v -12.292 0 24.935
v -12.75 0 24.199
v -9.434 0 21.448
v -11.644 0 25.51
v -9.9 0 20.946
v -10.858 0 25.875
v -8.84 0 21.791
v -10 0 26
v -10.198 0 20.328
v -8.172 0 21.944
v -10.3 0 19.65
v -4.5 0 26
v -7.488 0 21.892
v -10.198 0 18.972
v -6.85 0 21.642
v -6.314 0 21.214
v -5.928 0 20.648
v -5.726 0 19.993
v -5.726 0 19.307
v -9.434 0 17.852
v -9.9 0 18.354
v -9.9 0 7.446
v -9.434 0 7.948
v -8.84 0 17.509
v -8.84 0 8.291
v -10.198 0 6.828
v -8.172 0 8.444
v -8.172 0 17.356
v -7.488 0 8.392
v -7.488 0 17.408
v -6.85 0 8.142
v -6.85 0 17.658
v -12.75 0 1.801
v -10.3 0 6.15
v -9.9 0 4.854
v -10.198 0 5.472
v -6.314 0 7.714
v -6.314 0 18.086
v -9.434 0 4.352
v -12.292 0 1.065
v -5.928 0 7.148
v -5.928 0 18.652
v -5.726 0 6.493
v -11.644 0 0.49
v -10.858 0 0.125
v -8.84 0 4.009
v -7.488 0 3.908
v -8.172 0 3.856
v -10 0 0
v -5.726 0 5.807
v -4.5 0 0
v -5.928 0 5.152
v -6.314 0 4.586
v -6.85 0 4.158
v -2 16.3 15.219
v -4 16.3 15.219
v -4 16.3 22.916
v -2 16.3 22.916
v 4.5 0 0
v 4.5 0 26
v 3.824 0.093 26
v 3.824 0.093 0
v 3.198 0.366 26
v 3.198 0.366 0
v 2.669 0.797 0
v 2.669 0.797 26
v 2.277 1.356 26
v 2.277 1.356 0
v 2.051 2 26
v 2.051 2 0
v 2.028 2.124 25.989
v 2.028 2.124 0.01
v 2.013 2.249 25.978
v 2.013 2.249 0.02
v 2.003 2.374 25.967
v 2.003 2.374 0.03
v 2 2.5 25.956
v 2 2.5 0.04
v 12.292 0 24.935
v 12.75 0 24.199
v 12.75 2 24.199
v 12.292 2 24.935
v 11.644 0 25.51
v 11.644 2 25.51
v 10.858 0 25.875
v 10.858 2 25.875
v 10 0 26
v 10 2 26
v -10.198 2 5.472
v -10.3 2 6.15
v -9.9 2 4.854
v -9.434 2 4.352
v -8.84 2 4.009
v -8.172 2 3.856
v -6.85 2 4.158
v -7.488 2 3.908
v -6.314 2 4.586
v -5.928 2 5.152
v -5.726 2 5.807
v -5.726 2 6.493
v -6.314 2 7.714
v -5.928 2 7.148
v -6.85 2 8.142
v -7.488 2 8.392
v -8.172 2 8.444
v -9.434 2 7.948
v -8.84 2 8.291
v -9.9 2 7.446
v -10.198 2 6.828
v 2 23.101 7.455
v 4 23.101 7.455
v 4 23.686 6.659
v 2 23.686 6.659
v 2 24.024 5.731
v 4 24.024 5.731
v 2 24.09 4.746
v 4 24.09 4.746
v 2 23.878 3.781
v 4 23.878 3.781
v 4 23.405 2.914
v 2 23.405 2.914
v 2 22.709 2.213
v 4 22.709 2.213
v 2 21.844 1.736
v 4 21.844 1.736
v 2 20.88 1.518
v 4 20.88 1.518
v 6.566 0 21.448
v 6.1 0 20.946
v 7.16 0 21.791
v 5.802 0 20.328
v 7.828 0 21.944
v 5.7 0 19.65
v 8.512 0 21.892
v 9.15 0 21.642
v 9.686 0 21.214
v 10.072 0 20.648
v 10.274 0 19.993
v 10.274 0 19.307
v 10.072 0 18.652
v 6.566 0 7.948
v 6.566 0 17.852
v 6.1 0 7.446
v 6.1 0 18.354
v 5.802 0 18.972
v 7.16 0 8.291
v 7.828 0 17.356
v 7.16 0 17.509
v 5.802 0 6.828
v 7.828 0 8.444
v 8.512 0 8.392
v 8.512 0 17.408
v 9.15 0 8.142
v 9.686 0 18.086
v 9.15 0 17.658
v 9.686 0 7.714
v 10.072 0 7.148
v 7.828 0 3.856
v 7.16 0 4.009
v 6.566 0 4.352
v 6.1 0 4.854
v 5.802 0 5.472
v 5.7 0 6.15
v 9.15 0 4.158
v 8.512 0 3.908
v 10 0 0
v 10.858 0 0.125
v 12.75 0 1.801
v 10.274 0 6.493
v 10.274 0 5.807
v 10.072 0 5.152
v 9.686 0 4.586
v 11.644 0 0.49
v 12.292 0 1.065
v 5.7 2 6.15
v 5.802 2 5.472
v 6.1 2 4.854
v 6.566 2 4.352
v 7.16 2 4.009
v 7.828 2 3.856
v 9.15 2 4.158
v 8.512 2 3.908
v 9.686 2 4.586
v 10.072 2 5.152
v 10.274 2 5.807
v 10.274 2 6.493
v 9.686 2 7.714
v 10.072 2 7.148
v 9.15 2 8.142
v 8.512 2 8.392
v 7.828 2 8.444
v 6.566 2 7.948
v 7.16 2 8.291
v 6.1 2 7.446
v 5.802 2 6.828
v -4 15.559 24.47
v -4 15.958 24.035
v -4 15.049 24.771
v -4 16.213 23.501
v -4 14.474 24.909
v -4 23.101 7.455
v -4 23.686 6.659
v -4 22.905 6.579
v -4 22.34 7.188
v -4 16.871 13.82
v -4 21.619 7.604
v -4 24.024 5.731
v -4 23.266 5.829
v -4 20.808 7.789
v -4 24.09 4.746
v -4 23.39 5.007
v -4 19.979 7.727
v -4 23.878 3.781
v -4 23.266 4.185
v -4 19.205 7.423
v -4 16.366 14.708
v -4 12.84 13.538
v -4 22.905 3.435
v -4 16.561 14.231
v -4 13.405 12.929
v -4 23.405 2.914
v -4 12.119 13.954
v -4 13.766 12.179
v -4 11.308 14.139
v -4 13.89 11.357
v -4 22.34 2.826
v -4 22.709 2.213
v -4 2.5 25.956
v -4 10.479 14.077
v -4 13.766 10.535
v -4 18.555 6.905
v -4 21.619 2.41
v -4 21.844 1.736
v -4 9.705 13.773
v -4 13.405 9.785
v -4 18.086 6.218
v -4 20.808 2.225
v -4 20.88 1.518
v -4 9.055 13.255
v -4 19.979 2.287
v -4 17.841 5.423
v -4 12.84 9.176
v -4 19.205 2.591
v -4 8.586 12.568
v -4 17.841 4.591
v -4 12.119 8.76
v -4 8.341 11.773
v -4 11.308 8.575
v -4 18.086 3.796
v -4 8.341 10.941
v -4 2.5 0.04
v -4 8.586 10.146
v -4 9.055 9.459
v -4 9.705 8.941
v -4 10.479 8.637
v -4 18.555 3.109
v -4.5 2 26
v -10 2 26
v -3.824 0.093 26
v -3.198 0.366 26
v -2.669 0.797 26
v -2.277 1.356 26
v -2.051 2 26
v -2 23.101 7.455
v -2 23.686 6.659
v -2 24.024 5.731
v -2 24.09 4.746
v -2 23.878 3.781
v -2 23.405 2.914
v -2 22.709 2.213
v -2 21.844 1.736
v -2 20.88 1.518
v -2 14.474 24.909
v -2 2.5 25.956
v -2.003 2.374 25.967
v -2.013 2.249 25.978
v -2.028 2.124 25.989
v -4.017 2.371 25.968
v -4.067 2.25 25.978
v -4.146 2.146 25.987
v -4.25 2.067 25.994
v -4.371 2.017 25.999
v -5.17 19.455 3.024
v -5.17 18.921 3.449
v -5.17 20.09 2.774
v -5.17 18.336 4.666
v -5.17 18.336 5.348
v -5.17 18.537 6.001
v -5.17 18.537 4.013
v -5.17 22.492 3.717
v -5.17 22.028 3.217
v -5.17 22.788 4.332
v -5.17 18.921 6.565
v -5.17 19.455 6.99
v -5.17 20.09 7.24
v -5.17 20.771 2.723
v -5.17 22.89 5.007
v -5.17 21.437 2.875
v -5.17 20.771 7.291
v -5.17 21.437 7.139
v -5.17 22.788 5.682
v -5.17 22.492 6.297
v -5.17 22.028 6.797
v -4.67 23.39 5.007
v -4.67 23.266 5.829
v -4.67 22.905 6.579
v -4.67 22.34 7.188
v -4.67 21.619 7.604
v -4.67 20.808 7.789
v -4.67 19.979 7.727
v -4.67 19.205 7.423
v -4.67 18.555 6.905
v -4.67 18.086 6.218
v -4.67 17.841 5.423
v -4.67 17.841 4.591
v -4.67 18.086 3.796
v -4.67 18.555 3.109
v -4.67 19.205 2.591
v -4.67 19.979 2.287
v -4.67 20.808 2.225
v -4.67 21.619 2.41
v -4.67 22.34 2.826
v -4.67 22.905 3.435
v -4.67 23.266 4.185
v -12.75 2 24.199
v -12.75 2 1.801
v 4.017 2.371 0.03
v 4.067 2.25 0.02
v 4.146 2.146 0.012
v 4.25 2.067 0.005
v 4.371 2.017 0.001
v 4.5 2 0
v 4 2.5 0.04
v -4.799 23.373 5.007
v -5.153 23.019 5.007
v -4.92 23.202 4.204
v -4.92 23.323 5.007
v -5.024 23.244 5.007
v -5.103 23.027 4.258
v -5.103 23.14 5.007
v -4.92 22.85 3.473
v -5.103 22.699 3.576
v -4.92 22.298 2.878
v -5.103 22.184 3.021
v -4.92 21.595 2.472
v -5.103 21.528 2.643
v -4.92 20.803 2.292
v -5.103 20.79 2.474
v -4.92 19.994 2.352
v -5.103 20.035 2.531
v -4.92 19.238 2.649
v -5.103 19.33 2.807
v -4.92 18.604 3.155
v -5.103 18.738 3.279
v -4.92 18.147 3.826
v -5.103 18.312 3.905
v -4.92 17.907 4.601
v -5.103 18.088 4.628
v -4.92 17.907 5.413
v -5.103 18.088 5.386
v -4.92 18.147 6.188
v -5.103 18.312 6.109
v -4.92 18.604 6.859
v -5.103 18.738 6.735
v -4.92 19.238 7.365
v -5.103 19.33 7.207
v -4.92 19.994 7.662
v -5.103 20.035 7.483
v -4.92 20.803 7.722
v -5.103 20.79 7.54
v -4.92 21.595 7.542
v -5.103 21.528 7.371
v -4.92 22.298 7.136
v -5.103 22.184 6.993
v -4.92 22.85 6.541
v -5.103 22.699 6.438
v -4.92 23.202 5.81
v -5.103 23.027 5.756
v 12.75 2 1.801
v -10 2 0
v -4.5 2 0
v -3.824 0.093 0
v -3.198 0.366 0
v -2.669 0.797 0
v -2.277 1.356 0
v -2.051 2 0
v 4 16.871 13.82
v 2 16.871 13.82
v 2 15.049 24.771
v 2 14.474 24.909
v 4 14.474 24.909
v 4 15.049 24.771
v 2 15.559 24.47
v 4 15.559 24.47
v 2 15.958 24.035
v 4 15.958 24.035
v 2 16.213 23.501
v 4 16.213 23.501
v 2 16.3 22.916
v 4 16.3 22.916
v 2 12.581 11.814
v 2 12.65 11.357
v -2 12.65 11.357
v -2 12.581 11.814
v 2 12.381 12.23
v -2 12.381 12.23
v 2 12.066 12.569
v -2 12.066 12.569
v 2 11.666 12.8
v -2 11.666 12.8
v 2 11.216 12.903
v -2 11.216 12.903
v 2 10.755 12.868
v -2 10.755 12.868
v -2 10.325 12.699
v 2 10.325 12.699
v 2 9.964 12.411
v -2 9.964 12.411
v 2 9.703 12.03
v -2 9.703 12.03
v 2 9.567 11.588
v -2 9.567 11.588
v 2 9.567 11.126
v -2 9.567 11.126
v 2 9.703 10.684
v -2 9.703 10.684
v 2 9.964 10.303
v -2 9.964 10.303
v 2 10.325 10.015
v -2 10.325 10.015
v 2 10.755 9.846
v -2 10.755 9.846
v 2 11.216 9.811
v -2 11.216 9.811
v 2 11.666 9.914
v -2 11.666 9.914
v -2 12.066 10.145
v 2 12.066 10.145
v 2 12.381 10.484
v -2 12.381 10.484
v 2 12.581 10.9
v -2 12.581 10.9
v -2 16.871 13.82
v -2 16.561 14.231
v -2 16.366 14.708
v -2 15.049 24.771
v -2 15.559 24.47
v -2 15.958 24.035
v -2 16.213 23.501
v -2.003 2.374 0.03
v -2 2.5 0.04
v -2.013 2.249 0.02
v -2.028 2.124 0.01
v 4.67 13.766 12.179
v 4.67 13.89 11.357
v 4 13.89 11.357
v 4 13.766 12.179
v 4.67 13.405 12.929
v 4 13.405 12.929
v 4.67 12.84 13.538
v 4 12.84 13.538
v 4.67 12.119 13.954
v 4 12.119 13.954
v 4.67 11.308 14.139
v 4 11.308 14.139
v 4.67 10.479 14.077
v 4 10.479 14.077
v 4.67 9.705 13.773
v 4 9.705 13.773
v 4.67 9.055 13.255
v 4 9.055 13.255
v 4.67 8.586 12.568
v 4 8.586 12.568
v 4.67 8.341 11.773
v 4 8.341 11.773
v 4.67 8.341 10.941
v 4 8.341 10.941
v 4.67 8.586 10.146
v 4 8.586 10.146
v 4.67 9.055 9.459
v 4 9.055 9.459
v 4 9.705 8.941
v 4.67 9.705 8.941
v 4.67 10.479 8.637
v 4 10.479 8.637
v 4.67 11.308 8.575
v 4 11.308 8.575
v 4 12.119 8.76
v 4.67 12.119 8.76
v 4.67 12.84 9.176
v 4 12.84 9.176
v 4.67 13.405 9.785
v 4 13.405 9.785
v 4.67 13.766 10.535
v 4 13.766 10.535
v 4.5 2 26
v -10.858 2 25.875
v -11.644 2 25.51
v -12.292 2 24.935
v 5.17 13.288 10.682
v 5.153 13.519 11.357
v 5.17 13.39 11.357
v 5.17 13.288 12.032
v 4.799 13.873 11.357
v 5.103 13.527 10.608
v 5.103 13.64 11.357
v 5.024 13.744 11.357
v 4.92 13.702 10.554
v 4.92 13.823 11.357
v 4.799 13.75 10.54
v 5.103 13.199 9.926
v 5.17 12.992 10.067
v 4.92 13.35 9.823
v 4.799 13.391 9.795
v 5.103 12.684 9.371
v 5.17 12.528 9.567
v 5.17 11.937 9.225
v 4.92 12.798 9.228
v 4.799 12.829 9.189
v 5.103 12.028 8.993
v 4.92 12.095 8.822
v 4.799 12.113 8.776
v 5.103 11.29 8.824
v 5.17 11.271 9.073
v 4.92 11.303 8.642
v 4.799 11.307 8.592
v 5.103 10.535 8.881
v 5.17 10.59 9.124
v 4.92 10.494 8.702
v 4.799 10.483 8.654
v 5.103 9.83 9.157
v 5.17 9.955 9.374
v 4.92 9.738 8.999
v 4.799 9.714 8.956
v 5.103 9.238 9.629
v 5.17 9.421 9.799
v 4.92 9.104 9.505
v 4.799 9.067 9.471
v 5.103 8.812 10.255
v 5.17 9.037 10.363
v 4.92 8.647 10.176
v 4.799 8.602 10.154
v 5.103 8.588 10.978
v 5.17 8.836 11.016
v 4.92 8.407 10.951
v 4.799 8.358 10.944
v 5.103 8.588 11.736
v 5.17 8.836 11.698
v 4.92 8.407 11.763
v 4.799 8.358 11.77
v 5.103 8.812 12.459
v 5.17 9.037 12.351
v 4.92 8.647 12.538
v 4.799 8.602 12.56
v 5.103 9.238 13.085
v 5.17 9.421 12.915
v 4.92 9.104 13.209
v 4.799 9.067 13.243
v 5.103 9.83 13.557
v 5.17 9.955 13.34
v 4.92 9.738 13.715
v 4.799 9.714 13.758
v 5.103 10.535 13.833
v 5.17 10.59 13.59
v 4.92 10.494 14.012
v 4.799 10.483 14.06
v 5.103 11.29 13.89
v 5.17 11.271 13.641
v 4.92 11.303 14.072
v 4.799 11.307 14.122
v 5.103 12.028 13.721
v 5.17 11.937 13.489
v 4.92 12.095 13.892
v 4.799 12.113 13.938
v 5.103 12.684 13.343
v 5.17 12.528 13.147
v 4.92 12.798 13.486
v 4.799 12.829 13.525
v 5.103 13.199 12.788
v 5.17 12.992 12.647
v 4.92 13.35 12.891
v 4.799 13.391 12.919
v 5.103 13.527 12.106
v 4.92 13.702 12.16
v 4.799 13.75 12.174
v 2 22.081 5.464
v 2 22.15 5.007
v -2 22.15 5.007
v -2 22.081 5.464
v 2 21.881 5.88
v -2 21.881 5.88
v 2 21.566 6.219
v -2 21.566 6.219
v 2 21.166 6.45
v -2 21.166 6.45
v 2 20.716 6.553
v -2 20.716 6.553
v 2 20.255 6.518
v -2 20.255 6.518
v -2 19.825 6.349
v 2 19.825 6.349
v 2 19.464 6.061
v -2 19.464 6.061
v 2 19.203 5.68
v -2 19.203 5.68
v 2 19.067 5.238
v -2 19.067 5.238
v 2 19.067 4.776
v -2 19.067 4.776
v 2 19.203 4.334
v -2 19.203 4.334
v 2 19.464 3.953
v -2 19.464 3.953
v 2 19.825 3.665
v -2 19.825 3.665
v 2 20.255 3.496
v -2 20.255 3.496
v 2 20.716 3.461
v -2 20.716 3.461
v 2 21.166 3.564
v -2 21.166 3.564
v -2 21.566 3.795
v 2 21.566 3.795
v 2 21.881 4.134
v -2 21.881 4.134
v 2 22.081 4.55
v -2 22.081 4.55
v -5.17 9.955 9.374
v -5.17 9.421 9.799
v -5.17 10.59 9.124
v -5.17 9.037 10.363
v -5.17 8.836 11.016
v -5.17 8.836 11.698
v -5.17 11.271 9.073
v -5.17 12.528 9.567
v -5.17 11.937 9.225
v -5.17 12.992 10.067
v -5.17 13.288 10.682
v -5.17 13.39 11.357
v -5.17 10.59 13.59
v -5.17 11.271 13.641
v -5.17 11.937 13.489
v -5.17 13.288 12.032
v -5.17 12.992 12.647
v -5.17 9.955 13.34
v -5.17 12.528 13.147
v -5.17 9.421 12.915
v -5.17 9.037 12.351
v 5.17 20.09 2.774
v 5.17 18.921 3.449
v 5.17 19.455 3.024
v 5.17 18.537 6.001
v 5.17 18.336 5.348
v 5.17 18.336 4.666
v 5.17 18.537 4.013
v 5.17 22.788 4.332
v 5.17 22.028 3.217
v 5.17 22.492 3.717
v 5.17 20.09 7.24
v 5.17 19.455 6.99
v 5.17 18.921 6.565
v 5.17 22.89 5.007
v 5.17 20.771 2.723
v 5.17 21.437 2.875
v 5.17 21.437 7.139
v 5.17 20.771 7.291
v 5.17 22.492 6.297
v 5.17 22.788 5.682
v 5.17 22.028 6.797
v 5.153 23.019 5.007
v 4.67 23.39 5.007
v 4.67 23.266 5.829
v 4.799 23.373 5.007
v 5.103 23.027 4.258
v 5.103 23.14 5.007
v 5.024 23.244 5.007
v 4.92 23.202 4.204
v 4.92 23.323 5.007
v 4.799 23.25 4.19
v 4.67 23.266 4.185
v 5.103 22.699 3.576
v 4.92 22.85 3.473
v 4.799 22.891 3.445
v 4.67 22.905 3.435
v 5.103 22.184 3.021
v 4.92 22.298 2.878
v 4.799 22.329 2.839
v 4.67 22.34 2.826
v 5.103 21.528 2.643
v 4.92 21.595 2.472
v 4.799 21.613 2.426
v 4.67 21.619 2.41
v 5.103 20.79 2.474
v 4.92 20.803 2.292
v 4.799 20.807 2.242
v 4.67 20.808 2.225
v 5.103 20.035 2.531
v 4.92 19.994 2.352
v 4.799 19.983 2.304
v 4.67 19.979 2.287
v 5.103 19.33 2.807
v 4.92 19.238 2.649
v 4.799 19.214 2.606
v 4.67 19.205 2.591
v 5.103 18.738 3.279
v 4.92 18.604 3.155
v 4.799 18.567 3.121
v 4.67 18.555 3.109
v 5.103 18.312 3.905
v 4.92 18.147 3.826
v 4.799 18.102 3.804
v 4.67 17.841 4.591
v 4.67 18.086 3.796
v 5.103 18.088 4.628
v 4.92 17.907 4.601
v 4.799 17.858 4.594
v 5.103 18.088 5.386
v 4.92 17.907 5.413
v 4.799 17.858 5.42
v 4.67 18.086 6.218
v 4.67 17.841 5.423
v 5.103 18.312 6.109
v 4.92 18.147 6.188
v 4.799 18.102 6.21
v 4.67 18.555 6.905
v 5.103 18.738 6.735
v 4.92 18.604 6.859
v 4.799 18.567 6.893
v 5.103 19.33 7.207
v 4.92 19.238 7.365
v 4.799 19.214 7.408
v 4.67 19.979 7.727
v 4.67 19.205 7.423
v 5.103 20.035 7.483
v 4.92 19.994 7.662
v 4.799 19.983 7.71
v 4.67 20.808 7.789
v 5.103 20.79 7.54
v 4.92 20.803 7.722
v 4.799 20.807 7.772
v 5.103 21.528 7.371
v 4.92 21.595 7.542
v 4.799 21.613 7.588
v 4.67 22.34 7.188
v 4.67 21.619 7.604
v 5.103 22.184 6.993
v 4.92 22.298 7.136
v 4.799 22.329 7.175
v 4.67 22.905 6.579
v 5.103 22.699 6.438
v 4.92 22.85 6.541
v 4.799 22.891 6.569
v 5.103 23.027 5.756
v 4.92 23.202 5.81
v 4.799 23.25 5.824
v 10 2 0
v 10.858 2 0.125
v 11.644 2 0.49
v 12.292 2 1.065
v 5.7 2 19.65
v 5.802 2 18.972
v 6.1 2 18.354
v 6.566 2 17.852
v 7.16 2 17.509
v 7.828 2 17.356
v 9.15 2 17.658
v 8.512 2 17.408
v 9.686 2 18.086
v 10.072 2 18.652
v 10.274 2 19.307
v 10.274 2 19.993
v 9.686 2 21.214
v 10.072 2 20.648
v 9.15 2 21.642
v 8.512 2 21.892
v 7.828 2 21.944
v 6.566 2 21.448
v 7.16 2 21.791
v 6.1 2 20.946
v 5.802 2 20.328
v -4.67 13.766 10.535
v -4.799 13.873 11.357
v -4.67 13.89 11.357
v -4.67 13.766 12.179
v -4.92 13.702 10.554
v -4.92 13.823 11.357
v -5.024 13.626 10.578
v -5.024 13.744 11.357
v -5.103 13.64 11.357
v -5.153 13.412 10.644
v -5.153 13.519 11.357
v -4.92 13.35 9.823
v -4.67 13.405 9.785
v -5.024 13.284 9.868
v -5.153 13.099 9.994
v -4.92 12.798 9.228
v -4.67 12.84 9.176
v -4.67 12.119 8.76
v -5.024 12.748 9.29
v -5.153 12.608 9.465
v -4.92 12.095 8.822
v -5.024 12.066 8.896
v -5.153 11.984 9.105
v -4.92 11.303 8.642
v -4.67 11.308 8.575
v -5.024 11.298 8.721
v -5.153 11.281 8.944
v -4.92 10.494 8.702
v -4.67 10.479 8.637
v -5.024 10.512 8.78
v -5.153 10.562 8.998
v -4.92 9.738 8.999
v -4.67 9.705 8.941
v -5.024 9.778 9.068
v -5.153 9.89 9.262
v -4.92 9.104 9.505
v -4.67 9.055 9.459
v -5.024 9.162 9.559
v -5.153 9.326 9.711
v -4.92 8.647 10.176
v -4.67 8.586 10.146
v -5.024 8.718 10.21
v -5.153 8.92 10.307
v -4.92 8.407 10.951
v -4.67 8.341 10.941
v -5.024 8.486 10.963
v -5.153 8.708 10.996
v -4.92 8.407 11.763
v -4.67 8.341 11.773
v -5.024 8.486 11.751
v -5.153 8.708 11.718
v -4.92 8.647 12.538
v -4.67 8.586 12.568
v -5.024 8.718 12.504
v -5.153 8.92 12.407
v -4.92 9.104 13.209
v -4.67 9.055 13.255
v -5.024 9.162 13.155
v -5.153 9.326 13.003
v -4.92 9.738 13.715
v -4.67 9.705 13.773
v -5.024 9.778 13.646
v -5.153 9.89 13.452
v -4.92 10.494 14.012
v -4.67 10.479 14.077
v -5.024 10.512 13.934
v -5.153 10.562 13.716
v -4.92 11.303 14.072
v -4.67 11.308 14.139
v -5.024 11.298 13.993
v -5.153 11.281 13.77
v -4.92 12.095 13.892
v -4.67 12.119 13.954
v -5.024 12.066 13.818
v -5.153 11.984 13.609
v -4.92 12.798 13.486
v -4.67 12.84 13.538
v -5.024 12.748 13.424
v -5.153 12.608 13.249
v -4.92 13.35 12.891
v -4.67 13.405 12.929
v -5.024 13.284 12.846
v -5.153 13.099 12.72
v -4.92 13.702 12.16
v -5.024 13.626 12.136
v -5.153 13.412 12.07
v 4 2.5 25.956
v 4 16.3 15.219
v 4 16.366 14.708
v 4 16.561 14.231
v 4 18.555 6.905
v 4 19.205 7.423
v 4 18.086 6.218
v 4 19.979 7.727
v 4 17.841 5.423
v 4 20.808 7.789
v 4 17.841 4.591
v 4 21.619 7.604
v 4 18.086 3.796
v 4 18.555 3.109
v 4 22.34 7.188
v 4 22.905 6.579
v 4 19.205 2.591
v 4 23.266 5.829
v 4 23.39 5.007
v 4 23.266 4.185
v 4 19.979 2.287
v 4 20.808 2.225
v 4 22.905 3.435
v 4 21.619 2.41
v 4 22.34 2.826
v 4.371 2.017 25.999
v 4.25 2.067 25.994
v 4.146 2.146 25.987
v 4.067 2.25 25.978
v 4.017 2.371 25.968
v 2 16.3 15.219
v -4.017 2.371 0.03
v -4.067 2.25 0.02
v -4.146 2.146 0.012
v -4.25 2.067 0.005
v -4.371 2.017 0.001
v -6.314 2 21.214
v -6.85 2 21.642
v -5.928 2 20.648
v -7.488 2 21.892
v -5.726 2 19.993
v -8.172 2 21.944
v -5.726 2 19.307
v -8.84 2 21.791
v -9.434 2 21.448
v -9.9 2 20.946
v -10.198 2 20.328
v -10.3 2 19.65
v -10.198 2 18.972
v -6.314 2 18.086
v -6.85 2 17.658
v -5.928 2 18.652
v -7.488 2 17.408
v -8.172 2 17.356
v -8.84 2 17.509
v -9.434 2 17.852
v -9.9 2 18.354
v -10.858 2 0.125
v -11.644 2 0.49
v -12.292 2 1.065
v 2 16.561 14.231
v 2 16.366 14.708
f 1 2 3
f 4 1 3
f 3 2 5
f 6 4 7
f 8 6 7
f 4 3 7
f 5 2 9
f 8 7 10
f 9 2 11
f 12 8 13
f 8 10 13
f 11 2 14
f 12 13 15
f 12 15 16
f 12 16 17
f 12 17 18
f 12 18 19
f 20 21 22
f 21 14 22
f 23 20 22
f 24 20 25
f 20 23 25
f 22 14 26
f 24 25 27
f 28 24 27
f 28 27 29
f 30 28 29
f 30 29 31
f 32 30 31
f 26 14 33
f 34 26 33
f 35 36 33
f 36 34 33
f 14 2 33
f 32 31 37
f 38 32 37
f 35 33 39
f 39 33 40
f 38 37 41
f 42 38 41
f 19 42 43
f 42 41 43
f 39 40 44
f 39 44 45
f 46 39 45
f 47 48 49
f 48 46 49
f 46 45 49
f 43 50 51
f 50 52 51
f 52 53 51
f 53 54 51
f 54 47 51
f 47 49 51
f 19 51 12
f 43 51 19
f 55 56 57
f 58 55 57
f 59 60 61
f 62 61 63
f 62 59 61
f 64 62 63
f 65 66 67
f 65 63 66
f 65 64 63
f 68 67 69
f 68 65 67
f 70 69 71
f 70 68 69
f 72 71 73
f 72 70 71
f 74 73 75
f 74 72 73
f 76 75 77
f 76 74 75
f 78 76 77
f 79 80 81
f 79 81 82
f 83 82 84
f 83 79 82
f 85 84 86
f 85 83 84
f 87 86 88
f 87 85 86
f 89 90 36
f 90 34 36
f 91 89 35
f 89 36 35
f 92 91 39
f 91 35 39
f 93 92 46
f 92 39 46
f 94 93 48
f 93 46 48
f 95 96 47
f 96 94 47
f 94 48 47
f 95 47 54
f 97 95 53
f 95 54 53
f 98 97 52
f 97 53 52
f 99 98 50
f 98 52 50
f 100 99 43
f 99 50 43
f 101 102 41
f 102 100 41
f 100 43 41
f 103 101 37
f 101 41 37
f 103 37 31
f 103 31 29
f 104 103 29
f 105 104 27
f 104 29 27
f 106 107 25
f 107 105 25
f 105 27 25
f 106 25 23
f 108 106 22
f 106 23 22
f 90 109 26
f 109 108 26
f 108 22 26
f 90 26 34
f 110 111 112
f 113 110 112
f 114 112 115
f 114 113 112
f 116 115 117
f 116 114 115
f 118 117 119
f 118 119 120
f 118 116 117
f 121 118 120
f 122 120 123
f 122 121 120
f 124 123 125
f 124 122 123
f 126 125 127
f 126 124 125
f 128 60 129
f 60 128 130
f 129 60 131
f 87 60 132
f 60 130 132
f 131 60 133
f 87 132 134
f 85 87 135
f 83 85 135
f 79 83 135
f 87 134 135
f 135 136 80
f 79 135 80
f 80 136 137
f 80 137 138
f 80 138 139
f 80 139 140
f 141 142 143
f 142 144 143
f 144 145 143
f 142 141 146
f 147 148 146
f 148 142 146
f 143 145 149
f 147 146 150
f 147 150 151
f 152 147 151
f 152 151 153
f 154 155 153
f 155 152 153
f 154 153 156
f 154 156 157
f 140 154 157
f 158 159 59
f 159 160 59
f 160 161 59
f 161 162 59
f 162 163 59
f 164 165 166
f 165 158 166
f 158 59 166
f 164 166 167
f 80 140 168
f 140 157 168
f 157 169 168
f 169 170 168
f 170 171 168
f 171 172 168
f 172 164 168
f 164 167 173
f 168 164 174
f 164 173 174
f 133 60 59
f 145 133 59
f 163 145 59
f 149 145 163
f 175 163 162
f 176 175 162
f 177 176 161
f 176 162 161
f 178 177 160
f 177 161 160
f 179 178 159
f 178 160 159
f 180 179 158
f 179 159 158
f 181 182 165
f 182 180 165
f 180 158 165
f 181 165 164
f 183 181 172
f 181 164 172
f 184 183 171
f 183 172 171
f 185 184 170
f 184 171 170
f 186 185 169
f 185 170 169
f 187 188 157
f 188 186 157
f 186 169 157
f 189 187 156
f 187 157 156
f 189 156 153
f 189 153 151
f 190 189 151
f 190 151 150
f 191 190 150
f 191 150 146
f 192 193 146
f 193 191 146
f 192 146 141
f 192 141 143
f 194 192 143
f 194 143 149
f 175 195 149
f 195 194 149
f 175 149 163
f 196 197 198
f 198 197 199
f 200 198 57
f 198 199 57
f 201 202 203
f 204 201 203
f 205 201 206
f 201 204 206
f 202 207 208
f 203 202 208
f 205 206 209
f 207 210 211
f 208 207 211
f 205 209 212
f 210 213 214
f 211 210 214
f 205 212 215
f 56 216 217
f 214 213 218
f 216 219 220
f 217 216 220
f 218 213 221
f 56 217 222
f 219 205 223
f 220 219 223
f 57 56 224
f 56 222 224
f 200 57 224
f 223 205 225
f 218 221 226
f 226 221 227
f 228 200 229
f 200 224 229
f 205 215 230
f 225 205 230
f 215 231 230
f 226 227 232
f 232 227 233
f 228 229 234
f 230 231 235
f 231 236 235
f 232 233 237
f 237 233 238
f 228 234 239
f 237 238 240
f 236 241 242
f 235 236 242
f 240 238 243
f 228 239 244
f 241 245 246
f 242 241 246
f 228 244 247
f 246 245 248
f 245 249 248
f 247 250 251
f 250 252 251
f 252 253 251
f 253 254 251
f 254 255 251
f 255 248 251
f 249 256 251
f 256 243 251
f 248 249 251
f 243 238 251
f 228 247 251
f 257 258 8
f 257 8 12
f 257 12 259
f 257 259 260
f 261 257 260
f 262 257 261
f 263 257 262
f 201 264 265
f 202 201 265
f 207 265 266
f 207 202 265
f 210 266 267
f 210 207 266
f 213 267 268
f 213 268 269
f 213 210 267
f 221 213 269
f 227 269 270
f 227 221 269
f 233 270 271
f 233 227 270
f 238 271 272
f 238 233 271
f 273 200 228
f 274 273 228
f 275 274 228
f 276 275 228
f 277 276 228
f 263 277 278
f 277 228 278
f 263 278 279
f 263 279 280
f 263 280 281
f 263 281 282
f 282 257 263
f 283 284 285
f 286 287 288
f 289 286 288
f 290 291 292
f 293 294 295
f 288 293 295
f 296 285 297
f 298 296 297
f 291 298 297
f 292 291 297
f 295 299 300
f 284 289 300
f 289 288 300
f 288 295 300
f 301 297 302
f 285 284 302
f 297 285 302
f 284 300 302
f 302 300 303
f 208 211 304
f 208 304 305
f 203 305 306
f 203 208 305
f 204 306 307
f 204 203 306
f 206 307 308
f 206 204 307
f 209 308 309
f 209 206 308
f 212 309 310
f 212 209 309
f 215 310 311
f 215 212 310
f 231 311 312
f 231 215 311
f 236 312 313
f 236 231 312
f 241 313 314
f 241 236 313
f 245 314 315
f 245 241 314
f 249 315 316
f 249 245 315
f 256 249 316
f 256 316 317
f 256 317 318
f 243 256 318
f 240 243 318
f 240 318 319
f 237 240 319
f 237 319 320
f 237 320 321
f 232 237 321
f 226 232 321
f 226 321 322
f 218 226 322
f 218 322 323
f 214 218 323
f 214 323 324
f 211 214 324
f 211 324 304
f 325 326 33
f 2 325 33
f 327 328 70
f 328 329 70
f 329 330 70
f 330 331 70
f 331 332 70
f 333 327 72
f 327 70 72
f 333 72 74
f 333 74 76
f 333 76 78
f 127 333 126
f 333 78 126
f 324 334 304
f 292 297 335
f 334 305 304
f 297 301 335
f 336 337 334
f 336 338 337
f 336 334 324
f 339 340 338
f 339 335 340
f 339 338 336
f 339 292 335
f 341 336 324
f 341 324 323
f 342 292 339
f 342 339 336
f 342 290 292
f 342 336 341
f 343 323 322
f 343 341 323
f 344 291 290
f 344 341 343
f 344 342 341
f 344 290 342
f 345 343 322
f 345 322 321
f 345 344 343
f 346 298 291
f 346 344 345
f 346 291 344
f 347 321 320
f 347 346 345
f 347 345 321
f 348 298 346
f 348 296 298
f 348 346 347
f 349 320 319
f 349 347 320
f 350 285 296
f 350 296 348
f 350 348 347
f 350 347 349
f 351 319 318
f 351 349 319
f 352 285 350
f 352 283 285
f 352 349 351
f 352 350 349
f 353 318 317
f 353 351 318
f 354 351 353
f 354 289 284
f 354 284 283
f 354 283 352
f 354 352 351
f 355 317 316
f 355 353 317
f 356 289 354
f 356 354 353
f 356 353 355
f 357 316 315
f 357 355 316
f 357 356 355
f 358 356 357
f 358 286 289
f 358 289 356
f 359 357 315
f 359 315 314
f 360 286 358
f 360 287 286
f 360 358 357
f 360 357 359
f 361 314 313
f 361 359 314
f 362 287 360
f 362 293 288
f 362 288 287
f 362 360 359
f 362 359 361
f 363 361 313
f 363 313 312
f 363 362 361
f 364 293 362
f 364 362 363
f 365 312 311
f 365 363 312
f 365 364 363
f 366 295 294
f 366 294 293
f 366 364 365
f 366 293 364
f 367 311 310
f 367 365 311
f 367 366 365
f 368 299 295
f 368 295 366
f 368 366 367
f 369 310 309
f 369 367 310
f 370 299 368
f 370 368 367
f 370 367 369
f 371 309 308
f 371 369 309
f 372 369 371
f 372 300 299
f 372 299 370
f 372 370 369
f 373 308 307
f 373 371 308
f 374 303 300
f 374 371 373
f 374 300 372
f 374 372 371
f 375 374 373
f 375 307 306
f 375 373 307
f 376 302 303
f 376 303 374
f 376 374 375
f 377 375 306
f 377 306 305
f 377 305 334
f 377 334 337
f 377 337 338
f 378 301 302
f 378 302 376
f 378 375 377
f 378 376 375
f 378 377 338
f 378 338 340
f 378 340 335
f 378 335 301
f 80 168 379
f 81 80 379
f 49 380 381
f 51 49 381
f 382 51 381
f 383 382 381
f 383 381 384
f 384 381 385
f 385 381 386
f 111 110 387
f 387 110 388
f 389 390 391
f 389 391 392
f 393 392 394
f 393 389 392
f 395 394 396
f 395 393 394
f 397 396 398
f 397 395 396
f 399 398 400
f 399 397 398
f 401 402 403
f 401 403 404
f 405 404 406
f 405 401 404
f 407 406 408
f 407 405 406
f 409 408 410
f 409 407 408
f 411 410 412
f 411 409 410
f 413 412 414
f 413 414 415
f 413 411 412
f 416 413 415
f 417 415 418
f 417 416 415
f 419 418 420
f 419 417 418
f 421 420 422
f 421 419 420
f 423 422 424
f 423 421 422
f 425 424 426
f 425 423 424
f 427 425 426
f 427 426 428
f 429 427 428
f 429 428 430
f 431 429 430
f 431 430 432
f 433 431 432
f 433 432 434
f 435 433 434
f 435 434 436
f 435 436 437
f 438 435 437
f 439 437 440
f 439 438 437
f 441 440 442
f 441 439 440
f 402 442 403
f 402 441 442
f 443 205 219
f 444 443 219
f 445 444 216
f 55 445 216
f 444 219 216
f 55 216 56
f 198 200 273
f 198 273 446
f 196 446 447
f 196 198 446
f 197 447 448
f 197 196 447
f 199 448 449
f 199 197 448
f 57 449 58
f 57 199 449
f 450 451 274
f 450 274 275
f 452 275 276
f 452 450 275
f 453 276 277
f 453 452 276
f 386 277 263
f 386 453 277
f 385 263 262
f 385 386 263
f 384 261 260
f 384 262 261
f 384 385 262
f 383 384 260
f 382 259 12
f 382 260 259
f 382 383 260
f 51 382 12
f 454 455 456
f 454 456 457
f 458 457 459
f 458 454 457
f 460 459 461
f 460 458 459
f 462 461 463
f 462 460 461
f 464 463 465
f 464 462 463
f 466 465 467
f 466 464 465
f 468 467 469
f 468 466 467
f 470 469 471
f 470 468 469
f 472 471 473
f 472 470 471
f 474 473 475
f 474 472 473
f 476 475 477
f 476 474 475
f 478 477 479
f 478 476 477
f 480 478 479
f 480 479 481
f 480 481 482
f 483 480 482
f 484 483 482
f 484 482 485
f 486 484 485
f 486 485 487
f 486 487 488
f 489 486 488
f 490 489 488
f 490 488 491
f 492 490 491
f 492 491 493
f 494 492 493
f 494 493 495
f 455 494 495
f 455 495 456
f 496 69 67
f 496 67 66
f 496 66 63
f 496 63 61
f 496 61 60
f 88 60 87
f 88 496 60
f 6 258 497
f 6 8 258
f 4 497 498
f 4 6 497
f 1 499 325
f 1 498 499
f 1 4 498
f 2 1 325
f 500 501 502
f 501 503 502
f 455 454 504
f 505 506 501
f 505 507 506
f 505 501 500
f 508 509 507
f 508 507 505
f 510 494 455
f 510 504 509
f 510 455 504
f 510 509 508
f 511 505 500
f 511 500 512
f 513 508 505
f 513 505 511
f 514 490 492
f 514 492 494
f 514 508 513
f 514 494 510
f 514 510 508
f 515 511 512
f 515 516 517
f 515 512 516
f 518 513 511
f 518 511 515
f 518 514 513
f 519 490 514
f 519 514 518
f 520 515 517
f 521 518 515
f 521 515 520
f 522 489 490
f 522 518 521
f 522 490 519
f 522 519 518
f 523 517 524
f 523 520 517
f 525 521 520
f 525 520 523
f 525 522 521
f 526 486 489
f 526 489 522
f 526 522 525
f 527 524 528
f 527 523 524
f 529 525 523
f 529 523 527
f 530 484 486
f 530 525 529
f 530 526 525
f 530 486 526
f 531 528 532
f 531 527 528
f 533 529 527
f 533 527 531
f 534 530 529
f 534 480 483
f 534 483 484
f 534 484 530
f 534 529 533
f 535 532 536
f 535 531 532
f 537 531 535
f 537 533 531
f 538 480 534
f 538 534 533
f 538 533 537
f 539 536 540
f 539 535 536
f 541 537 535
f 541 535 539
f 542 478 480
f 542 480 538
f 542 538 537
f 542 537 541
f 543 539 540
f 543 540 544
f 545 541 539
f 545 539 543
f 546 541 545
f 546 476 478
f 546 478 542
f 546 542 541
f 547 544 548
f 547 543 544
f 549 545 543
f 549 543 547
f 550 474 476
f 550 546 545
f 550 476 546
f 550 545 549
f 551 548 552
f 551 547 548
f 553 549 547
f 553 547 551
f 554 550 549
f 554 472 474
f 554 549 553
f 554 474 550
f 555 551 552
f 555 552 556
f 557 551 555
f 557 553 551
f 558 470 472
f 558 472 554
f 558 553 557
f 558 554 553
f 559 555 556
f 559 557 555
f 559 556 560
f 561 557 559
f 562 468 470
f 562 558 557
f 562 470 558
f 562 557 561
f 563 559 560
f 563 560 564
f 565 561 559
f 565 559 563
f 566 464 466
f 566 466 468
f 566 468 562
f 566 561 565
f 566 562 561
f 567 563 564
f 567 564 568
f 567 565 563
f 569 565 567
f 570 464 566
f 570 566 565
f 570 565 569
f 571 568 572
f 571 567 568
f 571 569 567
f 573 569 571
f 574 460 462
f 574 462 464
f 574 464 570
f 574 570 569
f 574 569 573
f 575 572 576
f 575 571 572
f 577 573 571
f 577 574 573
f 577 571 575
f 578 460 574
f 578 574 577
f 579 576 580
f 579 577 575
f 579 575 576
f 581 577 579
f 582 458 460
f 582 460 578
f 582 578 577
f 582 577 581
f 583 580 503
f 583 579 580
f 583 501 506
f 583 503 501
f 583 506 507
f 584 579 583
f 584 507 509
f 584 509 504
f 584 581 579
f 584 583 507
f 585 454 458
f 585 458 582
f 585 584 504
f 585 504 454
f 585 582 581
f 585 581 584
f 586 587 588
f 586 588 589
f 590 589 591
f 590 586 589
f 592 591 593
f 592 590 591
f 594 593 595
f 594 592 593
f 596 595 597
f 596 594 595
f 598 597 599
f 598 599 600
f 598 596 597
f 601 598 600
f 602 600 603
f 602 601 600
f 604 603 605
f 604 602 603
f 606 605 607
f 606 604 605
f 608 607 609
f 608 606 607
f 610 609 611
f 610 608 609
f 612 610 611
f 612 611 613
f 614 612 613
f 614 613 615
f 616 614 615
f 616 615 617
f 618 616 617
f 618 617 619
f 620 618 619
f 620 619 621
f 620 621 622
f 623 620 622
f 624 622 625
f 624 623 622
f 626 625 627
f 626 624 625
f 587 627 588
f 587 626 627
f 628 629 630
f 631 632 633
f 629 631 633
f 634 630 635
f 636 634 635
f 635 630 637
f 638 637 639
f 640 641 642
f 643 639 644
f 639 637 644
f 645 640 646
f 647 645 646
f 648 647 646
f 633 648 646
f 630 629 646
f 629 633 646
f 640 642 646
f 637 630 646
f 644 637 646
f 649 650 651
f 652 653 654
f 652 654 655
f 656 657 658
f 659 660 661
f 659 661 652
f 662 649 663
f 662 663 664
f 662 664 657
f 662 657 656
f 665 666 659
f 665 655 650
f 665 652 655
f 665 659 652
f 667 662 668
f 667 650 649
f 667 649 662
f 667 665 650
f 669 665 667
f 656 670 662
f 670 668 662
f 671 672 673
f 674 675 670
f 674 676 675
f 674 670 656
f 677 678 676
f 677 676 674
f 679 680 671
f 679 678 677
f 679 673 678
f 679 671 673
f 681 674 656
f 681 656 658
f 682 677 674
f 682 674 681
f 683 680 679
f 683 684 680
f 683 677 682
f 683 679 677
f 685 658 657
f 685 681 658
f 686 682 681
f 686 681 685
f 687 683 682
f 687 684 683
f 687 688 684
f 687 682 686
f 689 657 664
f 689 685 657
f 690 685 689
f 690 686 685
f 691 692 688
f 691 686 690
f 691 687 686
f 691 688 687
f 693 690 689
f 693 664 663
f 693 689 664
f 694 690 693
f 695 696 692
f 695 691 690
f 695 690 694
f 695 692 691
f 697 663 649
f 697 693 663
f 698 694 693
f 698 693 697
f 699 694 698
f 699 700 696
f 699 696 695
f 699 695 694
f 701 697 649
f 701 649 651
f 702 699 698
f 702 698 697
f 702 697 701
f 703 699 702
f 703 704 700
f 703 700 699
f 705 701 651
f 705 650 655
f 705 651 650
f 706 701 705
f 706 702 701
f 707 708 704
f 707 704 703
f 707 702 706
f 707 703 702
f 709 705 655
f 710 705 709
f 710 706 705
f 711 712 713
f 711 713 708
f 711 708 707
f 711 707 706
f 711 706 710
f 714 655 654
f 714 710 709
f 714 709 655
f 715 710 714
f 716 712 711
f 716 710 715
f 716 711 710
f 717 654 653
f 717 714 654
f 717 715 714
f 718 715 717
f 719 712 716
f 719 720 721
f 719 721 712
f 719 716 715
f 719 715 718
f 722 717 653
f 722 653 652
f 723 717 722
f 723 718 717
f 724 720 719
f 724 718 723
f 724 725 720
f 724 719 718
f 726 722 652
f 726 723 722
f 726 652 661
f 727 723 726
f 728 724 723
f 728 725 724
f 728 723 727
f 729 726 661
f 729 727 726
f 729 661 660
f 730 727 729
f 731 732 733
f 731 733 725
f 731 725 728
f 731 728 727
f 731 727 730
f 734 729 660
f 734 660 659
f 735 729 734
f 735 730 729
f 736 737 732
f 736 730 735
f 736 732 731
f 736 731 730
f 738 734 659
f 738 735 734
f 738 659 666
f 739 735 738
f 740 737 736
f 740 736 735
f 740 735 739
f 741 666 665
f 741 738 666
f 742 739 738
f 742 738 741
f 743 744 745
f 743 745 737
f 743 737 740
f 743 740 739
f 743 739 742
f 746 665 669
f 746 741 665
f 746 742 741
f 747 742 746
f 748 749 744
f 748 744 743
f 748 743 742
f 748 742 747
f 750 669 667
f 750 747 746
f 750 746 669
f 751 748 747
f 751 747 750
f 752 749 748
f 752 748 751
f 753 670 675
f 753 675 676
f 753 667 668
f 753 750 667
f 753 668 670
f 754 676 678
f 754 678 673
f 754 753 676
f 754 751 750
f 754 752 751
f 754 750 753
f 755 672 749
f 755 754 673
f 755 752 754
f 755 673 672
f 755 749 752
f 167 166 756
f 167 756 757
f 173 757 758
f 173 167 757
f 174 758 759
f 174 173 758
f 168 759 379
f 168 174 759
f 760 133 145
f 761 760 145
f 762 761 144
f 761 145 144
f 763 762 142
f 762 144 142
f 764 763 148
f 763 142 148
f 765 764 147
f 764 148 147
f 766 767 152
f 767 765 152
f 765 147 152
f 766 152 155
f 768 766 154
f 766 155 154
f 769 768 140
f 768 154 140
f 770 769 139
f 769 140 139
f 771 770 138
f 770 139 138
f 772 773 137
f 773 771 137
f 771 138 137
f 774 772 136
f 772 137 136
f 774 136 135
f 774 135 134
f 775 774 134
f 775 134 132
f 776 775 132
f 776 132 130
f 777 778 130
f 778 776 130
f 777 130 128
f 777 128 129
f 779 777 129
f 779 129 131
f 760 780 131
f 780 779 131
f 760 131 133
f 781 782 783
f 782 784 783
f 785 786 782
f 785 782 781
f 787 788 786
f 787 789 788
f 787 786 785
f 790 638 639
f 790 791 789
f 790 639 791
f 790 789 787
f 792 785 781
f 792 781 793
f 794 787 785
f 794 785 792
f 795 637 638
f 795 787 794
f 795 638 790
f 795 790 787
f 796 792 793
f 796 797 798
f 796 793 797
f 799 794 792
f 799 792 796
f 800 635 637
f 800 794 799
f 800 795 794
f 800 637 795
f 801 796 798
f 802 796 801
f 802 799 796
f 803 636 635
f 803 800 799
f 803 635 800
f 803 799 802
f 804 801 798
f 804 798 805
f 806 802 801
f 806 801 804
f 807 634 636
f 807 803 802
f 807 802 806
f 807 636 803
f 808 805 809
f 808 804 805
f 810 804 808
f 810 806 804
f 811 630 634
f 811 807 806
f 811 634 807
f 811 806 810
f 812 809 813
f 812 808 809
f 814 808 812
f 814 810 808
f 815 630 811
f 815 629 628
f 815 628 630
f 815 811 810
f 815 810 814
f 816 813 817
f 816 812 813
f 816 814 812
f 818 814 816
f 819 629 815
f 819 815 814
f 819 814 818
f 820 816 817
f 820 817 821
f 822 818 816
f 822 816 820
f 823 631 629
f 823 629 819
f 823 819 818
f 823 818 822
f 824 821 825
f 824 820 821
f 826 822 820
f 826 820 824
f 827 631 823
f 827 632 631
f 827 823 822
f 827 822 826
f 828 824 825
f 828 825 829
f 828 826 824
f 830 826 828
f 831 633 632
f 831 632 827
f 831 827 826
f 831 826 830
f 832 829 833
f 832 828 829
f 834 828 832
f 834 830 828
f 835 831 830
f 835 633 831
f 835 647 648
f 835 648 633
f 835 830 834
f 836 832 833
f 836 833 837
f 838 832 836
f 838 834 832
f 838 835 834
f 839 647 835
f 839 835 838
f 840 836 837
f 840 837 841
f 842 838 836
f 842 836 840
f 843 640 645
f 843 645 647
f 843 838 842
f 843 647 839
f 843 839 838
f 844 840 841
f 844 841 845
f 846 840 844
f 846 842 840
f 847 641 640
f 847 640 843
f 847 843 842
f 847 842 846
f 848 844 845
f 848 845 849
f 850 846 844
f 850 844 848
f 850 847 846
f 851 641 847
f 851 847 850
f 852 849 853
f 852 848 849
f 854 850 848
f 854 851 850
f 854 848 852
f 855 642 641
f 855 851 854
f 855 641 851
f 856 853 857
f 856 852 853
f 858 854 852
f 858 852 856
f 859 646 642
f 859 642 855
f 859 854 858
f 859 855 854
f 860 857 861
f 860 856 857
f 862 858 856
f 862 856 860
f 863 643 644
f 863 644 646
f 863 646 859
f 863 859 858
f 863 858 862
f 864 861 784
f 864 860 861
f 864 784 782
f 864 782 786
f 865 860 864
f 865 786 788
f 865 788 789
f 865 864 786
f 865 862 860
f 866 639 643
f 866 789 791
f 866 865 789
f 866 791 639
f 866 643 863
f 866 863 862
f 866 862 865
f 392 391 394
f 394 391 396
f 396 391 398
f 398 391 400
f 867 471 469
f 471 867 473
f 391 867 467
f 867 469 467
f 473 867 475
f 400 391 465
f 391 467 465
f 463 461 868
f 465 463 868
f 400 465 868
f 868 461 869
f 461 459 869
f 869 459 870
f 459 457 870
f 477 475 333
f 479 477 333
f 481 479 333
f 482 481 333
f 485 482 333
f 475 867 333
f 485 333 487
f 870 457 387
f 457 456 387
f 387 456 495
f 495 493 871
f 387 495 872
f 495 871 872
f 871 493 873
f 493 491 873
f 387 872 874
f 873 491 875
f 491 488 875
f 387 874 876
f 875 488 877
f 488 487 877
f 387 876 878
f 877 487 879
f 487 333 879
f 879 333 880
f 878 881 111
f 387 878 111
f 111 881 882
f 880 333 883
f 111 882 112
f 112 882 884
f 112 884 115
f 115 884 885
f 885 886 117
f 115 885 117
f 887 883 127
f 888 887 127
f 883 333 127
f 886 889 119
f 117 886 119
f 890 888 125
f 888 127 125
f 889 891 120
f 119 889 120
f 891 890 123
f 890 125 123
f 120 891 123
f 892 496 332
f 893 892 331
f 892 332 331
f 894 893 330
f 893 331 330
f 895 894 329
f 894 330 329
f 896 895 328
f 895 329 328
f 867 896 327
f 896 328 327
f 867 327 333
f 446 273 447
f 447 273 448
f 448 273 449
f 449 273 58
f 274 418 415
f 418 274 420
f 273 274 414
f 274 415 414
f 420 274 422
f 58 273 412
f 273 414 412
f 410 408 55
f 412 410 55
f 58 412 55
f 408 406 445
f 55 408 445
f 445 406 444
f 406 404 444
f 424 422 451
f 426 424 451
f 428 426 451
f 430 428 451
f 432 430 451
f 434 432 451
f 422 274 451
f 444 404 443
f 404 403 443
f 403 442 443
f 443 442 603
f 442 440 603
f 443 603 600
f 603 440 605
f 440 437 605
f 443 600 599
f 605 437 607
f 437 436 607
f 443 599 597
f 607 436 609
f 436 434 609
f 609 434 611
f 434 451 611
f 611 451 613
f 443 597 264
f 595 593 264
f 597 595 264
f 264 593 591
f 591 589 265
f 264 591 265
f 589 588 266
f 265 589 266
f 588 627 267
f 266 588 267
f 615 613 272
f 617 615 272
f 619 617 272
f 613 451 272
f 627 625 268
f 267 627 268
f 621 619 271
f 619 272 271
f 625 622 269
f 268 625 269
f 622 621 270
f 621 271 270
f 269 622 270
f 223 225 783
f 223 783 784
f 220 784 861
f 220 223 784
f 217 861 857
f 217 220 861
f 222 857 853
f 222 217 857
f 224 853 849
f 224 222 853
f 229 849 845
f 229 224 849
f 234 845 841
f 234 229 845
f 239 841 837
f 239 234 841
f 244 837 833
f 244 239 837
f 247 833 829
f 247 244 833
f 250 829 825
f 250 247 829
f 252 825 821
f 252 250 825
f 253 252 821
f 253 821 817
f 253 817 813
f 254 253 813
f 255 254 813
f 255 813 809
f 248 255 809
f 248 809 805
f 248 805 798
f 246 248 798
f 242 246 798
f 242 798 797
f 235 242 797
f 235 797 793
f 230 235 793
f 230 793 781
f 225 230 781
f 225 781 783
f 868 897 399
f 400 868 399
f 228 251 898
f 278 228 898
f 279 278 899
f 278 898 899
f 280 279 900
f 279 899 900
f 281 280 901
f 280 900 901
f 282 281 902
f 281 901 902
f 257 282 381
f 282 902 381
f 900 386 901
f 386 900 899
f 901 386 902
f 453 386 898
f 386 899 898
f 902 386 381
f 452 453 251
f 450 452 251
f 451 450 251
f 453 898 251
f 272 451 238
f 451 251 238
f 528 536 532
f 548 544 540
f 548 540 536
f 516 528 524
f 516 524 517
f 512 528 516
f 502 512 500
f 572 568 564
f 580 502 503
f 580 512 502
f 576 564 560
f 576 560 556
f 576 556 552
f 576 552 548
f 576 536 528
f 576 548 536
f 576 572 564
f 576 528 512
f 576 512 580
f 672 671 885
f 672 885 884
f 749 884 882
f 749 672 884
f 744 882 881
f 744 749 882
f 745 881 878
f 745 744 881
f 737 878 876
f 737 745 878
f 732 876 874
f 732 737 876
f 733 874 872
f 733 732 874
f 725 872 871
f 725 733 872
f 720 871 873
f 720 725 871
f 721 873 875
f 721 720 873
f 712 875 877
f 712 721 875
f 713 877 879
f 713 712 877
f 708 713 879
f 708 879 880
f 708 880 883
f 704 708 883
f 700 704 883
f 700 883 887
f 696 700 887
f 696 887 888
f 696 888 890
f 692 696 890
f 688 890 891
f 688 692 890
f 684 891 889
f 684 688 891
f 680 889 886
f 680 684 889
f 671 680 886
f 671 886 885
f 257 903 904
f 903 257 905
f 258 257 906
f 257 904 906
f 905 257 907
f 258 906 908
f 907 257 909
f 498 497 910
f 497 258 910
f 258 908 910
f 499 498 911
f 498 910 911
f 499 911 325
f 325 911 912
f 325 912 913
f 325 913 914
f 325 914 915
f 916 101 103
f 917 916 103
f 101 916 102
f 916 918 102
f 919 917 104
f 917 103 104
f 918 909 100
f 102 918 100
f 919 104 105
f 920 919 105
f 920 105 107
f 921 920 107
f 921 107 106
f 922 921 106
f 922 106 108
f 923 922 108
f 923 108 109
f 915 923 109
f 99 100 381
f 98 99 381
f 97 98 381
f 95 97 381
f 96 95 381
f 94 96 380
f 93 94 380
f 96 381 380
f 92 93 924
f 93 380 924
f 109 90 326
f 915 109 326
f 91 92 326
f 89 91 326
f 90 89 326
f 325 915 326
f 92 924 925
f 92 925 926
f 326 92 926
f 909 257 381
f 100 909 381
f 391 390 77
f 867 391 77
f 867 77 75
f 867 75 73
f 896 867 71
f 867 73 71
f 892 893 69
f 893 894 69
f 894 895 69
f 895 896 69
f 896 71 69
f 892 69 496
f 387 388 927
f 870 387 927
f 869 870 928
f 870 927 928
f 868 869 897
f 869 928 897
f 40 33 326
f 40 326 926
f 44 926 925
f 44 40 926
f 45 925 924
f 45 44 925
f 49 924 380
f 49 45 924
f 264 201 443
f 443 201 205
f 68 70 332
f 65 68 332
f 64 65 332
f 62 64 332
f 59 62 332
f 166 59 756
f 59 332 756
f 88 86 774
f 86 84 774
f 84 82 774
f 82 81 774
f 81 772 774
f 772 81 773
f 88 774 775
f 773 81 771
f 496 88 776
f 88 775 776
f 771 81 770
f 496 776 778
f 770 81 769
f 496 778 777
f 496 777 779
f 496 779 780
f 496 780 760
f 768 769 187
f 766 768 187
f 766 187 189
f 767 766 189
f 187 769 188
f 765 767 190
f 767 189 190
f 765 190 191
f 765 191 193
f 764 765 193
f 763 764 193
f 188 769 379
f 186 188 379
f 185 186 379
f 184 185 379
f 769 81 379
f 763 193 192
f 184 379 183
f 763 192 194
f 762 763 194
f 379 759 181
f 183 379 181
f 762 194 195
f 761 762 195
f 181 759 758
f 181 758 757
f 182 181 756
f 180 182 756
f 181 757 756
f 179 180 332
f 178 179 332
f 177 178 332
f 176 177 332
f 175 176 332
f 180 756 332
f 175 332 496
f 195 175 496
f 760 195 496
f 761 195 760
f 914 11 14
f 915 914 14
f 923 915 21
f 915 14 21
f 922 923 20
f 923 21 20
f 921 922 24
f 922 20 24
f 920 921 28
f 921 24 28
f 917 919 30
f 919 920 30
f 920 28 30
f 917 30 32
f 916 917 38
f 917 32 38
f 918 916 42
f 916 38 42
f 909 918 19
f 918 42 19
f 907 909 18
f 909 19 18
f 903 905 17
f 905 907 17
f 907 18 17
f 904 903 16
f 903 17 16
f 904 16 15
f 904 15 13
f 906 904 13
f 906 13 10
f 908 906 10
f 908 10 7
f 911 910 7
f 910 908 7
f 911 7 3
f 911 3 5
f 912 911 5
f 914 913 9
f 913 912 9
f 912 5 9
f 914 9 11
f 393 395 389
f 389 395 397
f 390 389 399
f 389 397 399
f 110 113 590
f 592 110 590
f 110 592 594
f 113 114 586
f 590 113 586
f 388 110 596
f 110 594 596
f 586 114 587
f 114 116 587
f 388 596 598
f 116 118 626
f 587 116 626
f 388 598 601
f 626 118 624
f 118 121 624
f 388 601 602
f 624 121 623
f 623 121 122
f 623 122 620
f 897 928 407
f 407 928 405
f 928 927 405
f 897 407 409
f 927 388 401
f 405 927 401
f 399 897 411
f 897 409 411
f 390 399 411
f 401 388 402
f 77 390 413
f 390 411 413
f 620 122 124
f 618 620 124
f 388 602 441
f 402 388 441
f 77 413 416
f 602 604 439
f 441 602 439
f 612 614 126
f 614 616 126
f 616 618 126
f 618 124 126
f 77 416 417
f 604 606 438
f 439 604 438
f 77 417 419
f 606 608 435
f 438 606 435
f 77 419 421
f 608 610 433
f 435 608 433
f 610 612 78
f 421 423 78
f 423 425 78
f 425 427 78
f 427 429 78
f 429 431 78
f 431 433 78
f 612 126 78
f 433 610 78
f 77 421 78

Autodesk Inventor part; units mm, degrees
sketch "Skizze_1" plane through (0, 0, 0) normal (0, 0, 1) x (1, 0, 0)
  arc A0 (2, 2.5) -> (4.5, 0) centre (4.5, 2.5) ccw
  line L0 (4.5, 0) -> (12.75, 0)
  line L1 (12.75, 0) -> (12.75, 2)
  line L2 (12.75, 2) -> (4.5, 2)
  arc A1 (4, 2.5) -> (4.5, 2) centre (4.5, 2.5) ccw
  line L3 (4, 2.5) -> (4, 30)
  line L4 (4, 30) -> (2, 30)
  line L5 (2, 30) -> (2, 2.5)
extrude "Extrusion1" add sketch "Skizze_1" along normal blind 26
sketch "Skizze_2" plane through (0, 0, 5.007) normal (0, 0, 1) x (1, 0, 0)
  line L0 (5.17, 20.6) -> (0, 20.6)
  line L1 (-5.17, 20.6) -> (-5.17, 22.89)
  arc A0 (-4.67, 23.39) -> (-5.17, 22.89) centre (-4.67, 22.89) ccw
  line L2 (-4.67, 23.39) -> (-4, 23.39)
  line L3 (-4, 23.39) -> (-4, 22.15)
  line L4 (-4, 22.15) -> (4, 22.15)
  line L5 (4, 22.15) -> (4, 23.39)
  line L6 (4, 23.39) -> (4.67, 23.39)
  arc A1 (5.17, 22.89) -> (4.67, 23.39) centre (4.67, 22.89) ccw
  line L7 (5.17, 22.89) -> (5.17, 20.6)
  line L8 (5.17, 20.6) -> (-5.17, 20.6)
revolve "Revolution1" add sketch "Skizze_2" angle 360 about axis through (5.17, 20.6, 5.007) along (1, 0, 0)
sketch "Skizze_3" plane through (0, 0, 11.357) normal (0, 0, 1) x (1, 0, 0)
  line L0 (5.17, 11.1) -> (0, 11.1)
  line L1 (-5.17, 11.1) -> (-5.17, 13.39)
  arc A0 (-4.67, 13.89) -> (-5.17, 13.39) centre (-4.67, 13.39) ccw
  line L2 (-4.67, 13.89) -> (-4, 13.89)
  line L3 (-4, 13.89) -> (-4, 12.65)
  line L4 (-4, 12.65) -> (4, 12.65)
  line L5 (4, 12.65) -> (4, 13.89)
  line L6 (4, 13.89) -> (4.67, 13.89)
  arc A1 (5.17, 13.39) -> (4.67, 13.89) centre (4.67, 13.39) ccw
  line L7 (5.17, 13.39) -> (5.17, 11.1)
  line L8 (5.17, 11.1) -> (-5.17, 11.1)
revolve "Revolution2" add sketch "Skizze_3" angle 360 about axis through (5.17, 11.1, 11.357) along (1, 0, 0)
sketch "Skizze_5" plane through (0, 0, 0) normal (0, 0, 1) x (1, 0, 0)
  line L0 (-12.75, 2) -> (-12.75, 0)
  line L1 (-12.75, 0) -> (-4.5, 0)
  arc A0 (-4.5, 0) -> (-2, 2.5) centre (-4.5, 2.5) ccw
  line L2 (-2, 2.5) -> (-2, 30)
  line L3 (-2, 30) -> (-4, 30)
  line L4 (-4, 30) -> (-4, 2.5)
  arc A1 (-4.5, 2) -> (-4, 2.5) centre (-4.5, 2.5) ccw
  line L5 (-4.5, 2) -> (-12.75, 2)
extrude "Extrusion2" add sketch "Skizze_5" along normal blind 26
sketch "Skizze_6" plane through (0, 0, 0) normal (1, 0, 0) x (0, 1, 0)
  line L0 (-41, 77) -> (-41, -76)
  line L1 (-41, -76) -> (70, -76)
  line L2 (70, -76) -> (70, 77)
  line L3 (70, 77) -> (-41, 77)
  line L4 (2, 26) -> (0, 26)
  line L5 (0, 26) -> (0, 0)
  line L6 (0, 0) -> (2, 0)
  line L7 (2, 0) -> (20.8805, 1.5183)
  arc A0 (20.8805, 1.5183) -> (23.1011, 7.4554) centre (20.6, 5.007) ccw
  line L8 (23.1011, 7.4554) -> (16.8708, 13.8197)
  arc A1 (16.3, 15.2188) -> (16.8708, 13.8197) centre (18.3, 15.2188) ccw
  line L9 (16.3, 15.2188) -> (16.3, 22.9162)
  arc A2 (16.3, 22.9162) -> (14.4743, 24.9086) centre (14.3, 22.9162) ccw
  line L10 (14.4743, 24.9086) -> (2, 26)
extrude "Extrusion3" cut sketch "Skizze_6" along normal mid plane 100
sketch "Skizze_7" plane through (0, 0, 0) normal (0, 1, 0) x (-1, 0, 0)
  line L0 (50, 50) -> (-61, 50)
  line L1 (-61, 50) -> (-61, -33)
  line L2 (-61, -33) -> (50, -33)
  line L3 (50, -33) -> (50, 50)
  arc A0 (13, 23) -> (10, 26) centre (10, 23) ccw
  line L4 (10, 26) -> (-10, 26)
  arc A1 (-10, 26) -> (-13, 23) centre (-10, 23) ccw
  line L5 (-13, 23) -> (-13, 3)
  arc A2 (-13, 3) -> (-10, 0) centre (-10, 3) ccw
  line L6 (-10, 0) -> (10, 0)
  arc A3 (10, 0) -> (13, 3) centre (10, 3) ccw
  line L7 (13, 3) -> (13, 23)
extrude "Extrusion4" cut sketch "Skizze_7" along normal blind 2
sketch "Skizze_8_ALT_Drilling_1" plane through (0, 0, 0) normal (0, 1, 0) x (-1, 0, 0)
  circle A0 centre (-8, 6.15) radius 2.3
extrude "Extrusion5" cut sketch "Skizze_8_ALT_Drilling_1" along normal blind 2
sketch "Skizze_9_ALT_Drilling_2" plane through (0, 0, 0) normal (0, 1, 0) x (-1, 0, 0)
  circle A0 centre (-8, 19.65) radius 2.3
extrude "Extrusion6" cut sketch "Skizze_9_ALT_Drilling_2" along normal blind 2
sketch "Skizze_10_ALT_Drilling_3" plane through (0, 0, 0) normal (0, 1, 0) x (-1, 0, 0)
  circle A0 centre (8, 6.15) radius 2.3
extrude "Extrusion7" cut sketch "Skizze_10_ALT_Drilling_3" along normal blind 2
sketch "Skizze_11_ALT_Drilling_4" plane through (0, 0, 0) normal (0, 1, 0) x (-1, 0, 0)
  circle A0 centre (8, 19.65) radius 2.3
extrude "Extrusion8" cut sketch "Skizze_11_ALT_Drilling_4" along normal blind 2
ref_plane "WF1_XY" through (0, 20.6, 5.007) normal (1, 0, 0) x (0, 0, -1)
ref_plane "WF1_YZ" through (0, 20.6, 5.007) normal (0, 0, -1) x (0, 1, 0)
ref_plane "WF1_ZX" through (0, 20.6, 5.007) normal (0, 1, 0) x (1, 0, 0)
ref_plane "WF2_XY" through (0, 11.1, 11.357) normal (1, 0, 0) x (0, 0, -1)
ref_plane "WF2_YZ" through (0, 11.1, 11.357) normal (0, 0, -1) x (0, 1, 0)
ref_plane "WF2_ZX" through (0, 11.1, 11.357) normal (0, 1, 0) x (1, 0, 0)
properties part number "305-U-W"
